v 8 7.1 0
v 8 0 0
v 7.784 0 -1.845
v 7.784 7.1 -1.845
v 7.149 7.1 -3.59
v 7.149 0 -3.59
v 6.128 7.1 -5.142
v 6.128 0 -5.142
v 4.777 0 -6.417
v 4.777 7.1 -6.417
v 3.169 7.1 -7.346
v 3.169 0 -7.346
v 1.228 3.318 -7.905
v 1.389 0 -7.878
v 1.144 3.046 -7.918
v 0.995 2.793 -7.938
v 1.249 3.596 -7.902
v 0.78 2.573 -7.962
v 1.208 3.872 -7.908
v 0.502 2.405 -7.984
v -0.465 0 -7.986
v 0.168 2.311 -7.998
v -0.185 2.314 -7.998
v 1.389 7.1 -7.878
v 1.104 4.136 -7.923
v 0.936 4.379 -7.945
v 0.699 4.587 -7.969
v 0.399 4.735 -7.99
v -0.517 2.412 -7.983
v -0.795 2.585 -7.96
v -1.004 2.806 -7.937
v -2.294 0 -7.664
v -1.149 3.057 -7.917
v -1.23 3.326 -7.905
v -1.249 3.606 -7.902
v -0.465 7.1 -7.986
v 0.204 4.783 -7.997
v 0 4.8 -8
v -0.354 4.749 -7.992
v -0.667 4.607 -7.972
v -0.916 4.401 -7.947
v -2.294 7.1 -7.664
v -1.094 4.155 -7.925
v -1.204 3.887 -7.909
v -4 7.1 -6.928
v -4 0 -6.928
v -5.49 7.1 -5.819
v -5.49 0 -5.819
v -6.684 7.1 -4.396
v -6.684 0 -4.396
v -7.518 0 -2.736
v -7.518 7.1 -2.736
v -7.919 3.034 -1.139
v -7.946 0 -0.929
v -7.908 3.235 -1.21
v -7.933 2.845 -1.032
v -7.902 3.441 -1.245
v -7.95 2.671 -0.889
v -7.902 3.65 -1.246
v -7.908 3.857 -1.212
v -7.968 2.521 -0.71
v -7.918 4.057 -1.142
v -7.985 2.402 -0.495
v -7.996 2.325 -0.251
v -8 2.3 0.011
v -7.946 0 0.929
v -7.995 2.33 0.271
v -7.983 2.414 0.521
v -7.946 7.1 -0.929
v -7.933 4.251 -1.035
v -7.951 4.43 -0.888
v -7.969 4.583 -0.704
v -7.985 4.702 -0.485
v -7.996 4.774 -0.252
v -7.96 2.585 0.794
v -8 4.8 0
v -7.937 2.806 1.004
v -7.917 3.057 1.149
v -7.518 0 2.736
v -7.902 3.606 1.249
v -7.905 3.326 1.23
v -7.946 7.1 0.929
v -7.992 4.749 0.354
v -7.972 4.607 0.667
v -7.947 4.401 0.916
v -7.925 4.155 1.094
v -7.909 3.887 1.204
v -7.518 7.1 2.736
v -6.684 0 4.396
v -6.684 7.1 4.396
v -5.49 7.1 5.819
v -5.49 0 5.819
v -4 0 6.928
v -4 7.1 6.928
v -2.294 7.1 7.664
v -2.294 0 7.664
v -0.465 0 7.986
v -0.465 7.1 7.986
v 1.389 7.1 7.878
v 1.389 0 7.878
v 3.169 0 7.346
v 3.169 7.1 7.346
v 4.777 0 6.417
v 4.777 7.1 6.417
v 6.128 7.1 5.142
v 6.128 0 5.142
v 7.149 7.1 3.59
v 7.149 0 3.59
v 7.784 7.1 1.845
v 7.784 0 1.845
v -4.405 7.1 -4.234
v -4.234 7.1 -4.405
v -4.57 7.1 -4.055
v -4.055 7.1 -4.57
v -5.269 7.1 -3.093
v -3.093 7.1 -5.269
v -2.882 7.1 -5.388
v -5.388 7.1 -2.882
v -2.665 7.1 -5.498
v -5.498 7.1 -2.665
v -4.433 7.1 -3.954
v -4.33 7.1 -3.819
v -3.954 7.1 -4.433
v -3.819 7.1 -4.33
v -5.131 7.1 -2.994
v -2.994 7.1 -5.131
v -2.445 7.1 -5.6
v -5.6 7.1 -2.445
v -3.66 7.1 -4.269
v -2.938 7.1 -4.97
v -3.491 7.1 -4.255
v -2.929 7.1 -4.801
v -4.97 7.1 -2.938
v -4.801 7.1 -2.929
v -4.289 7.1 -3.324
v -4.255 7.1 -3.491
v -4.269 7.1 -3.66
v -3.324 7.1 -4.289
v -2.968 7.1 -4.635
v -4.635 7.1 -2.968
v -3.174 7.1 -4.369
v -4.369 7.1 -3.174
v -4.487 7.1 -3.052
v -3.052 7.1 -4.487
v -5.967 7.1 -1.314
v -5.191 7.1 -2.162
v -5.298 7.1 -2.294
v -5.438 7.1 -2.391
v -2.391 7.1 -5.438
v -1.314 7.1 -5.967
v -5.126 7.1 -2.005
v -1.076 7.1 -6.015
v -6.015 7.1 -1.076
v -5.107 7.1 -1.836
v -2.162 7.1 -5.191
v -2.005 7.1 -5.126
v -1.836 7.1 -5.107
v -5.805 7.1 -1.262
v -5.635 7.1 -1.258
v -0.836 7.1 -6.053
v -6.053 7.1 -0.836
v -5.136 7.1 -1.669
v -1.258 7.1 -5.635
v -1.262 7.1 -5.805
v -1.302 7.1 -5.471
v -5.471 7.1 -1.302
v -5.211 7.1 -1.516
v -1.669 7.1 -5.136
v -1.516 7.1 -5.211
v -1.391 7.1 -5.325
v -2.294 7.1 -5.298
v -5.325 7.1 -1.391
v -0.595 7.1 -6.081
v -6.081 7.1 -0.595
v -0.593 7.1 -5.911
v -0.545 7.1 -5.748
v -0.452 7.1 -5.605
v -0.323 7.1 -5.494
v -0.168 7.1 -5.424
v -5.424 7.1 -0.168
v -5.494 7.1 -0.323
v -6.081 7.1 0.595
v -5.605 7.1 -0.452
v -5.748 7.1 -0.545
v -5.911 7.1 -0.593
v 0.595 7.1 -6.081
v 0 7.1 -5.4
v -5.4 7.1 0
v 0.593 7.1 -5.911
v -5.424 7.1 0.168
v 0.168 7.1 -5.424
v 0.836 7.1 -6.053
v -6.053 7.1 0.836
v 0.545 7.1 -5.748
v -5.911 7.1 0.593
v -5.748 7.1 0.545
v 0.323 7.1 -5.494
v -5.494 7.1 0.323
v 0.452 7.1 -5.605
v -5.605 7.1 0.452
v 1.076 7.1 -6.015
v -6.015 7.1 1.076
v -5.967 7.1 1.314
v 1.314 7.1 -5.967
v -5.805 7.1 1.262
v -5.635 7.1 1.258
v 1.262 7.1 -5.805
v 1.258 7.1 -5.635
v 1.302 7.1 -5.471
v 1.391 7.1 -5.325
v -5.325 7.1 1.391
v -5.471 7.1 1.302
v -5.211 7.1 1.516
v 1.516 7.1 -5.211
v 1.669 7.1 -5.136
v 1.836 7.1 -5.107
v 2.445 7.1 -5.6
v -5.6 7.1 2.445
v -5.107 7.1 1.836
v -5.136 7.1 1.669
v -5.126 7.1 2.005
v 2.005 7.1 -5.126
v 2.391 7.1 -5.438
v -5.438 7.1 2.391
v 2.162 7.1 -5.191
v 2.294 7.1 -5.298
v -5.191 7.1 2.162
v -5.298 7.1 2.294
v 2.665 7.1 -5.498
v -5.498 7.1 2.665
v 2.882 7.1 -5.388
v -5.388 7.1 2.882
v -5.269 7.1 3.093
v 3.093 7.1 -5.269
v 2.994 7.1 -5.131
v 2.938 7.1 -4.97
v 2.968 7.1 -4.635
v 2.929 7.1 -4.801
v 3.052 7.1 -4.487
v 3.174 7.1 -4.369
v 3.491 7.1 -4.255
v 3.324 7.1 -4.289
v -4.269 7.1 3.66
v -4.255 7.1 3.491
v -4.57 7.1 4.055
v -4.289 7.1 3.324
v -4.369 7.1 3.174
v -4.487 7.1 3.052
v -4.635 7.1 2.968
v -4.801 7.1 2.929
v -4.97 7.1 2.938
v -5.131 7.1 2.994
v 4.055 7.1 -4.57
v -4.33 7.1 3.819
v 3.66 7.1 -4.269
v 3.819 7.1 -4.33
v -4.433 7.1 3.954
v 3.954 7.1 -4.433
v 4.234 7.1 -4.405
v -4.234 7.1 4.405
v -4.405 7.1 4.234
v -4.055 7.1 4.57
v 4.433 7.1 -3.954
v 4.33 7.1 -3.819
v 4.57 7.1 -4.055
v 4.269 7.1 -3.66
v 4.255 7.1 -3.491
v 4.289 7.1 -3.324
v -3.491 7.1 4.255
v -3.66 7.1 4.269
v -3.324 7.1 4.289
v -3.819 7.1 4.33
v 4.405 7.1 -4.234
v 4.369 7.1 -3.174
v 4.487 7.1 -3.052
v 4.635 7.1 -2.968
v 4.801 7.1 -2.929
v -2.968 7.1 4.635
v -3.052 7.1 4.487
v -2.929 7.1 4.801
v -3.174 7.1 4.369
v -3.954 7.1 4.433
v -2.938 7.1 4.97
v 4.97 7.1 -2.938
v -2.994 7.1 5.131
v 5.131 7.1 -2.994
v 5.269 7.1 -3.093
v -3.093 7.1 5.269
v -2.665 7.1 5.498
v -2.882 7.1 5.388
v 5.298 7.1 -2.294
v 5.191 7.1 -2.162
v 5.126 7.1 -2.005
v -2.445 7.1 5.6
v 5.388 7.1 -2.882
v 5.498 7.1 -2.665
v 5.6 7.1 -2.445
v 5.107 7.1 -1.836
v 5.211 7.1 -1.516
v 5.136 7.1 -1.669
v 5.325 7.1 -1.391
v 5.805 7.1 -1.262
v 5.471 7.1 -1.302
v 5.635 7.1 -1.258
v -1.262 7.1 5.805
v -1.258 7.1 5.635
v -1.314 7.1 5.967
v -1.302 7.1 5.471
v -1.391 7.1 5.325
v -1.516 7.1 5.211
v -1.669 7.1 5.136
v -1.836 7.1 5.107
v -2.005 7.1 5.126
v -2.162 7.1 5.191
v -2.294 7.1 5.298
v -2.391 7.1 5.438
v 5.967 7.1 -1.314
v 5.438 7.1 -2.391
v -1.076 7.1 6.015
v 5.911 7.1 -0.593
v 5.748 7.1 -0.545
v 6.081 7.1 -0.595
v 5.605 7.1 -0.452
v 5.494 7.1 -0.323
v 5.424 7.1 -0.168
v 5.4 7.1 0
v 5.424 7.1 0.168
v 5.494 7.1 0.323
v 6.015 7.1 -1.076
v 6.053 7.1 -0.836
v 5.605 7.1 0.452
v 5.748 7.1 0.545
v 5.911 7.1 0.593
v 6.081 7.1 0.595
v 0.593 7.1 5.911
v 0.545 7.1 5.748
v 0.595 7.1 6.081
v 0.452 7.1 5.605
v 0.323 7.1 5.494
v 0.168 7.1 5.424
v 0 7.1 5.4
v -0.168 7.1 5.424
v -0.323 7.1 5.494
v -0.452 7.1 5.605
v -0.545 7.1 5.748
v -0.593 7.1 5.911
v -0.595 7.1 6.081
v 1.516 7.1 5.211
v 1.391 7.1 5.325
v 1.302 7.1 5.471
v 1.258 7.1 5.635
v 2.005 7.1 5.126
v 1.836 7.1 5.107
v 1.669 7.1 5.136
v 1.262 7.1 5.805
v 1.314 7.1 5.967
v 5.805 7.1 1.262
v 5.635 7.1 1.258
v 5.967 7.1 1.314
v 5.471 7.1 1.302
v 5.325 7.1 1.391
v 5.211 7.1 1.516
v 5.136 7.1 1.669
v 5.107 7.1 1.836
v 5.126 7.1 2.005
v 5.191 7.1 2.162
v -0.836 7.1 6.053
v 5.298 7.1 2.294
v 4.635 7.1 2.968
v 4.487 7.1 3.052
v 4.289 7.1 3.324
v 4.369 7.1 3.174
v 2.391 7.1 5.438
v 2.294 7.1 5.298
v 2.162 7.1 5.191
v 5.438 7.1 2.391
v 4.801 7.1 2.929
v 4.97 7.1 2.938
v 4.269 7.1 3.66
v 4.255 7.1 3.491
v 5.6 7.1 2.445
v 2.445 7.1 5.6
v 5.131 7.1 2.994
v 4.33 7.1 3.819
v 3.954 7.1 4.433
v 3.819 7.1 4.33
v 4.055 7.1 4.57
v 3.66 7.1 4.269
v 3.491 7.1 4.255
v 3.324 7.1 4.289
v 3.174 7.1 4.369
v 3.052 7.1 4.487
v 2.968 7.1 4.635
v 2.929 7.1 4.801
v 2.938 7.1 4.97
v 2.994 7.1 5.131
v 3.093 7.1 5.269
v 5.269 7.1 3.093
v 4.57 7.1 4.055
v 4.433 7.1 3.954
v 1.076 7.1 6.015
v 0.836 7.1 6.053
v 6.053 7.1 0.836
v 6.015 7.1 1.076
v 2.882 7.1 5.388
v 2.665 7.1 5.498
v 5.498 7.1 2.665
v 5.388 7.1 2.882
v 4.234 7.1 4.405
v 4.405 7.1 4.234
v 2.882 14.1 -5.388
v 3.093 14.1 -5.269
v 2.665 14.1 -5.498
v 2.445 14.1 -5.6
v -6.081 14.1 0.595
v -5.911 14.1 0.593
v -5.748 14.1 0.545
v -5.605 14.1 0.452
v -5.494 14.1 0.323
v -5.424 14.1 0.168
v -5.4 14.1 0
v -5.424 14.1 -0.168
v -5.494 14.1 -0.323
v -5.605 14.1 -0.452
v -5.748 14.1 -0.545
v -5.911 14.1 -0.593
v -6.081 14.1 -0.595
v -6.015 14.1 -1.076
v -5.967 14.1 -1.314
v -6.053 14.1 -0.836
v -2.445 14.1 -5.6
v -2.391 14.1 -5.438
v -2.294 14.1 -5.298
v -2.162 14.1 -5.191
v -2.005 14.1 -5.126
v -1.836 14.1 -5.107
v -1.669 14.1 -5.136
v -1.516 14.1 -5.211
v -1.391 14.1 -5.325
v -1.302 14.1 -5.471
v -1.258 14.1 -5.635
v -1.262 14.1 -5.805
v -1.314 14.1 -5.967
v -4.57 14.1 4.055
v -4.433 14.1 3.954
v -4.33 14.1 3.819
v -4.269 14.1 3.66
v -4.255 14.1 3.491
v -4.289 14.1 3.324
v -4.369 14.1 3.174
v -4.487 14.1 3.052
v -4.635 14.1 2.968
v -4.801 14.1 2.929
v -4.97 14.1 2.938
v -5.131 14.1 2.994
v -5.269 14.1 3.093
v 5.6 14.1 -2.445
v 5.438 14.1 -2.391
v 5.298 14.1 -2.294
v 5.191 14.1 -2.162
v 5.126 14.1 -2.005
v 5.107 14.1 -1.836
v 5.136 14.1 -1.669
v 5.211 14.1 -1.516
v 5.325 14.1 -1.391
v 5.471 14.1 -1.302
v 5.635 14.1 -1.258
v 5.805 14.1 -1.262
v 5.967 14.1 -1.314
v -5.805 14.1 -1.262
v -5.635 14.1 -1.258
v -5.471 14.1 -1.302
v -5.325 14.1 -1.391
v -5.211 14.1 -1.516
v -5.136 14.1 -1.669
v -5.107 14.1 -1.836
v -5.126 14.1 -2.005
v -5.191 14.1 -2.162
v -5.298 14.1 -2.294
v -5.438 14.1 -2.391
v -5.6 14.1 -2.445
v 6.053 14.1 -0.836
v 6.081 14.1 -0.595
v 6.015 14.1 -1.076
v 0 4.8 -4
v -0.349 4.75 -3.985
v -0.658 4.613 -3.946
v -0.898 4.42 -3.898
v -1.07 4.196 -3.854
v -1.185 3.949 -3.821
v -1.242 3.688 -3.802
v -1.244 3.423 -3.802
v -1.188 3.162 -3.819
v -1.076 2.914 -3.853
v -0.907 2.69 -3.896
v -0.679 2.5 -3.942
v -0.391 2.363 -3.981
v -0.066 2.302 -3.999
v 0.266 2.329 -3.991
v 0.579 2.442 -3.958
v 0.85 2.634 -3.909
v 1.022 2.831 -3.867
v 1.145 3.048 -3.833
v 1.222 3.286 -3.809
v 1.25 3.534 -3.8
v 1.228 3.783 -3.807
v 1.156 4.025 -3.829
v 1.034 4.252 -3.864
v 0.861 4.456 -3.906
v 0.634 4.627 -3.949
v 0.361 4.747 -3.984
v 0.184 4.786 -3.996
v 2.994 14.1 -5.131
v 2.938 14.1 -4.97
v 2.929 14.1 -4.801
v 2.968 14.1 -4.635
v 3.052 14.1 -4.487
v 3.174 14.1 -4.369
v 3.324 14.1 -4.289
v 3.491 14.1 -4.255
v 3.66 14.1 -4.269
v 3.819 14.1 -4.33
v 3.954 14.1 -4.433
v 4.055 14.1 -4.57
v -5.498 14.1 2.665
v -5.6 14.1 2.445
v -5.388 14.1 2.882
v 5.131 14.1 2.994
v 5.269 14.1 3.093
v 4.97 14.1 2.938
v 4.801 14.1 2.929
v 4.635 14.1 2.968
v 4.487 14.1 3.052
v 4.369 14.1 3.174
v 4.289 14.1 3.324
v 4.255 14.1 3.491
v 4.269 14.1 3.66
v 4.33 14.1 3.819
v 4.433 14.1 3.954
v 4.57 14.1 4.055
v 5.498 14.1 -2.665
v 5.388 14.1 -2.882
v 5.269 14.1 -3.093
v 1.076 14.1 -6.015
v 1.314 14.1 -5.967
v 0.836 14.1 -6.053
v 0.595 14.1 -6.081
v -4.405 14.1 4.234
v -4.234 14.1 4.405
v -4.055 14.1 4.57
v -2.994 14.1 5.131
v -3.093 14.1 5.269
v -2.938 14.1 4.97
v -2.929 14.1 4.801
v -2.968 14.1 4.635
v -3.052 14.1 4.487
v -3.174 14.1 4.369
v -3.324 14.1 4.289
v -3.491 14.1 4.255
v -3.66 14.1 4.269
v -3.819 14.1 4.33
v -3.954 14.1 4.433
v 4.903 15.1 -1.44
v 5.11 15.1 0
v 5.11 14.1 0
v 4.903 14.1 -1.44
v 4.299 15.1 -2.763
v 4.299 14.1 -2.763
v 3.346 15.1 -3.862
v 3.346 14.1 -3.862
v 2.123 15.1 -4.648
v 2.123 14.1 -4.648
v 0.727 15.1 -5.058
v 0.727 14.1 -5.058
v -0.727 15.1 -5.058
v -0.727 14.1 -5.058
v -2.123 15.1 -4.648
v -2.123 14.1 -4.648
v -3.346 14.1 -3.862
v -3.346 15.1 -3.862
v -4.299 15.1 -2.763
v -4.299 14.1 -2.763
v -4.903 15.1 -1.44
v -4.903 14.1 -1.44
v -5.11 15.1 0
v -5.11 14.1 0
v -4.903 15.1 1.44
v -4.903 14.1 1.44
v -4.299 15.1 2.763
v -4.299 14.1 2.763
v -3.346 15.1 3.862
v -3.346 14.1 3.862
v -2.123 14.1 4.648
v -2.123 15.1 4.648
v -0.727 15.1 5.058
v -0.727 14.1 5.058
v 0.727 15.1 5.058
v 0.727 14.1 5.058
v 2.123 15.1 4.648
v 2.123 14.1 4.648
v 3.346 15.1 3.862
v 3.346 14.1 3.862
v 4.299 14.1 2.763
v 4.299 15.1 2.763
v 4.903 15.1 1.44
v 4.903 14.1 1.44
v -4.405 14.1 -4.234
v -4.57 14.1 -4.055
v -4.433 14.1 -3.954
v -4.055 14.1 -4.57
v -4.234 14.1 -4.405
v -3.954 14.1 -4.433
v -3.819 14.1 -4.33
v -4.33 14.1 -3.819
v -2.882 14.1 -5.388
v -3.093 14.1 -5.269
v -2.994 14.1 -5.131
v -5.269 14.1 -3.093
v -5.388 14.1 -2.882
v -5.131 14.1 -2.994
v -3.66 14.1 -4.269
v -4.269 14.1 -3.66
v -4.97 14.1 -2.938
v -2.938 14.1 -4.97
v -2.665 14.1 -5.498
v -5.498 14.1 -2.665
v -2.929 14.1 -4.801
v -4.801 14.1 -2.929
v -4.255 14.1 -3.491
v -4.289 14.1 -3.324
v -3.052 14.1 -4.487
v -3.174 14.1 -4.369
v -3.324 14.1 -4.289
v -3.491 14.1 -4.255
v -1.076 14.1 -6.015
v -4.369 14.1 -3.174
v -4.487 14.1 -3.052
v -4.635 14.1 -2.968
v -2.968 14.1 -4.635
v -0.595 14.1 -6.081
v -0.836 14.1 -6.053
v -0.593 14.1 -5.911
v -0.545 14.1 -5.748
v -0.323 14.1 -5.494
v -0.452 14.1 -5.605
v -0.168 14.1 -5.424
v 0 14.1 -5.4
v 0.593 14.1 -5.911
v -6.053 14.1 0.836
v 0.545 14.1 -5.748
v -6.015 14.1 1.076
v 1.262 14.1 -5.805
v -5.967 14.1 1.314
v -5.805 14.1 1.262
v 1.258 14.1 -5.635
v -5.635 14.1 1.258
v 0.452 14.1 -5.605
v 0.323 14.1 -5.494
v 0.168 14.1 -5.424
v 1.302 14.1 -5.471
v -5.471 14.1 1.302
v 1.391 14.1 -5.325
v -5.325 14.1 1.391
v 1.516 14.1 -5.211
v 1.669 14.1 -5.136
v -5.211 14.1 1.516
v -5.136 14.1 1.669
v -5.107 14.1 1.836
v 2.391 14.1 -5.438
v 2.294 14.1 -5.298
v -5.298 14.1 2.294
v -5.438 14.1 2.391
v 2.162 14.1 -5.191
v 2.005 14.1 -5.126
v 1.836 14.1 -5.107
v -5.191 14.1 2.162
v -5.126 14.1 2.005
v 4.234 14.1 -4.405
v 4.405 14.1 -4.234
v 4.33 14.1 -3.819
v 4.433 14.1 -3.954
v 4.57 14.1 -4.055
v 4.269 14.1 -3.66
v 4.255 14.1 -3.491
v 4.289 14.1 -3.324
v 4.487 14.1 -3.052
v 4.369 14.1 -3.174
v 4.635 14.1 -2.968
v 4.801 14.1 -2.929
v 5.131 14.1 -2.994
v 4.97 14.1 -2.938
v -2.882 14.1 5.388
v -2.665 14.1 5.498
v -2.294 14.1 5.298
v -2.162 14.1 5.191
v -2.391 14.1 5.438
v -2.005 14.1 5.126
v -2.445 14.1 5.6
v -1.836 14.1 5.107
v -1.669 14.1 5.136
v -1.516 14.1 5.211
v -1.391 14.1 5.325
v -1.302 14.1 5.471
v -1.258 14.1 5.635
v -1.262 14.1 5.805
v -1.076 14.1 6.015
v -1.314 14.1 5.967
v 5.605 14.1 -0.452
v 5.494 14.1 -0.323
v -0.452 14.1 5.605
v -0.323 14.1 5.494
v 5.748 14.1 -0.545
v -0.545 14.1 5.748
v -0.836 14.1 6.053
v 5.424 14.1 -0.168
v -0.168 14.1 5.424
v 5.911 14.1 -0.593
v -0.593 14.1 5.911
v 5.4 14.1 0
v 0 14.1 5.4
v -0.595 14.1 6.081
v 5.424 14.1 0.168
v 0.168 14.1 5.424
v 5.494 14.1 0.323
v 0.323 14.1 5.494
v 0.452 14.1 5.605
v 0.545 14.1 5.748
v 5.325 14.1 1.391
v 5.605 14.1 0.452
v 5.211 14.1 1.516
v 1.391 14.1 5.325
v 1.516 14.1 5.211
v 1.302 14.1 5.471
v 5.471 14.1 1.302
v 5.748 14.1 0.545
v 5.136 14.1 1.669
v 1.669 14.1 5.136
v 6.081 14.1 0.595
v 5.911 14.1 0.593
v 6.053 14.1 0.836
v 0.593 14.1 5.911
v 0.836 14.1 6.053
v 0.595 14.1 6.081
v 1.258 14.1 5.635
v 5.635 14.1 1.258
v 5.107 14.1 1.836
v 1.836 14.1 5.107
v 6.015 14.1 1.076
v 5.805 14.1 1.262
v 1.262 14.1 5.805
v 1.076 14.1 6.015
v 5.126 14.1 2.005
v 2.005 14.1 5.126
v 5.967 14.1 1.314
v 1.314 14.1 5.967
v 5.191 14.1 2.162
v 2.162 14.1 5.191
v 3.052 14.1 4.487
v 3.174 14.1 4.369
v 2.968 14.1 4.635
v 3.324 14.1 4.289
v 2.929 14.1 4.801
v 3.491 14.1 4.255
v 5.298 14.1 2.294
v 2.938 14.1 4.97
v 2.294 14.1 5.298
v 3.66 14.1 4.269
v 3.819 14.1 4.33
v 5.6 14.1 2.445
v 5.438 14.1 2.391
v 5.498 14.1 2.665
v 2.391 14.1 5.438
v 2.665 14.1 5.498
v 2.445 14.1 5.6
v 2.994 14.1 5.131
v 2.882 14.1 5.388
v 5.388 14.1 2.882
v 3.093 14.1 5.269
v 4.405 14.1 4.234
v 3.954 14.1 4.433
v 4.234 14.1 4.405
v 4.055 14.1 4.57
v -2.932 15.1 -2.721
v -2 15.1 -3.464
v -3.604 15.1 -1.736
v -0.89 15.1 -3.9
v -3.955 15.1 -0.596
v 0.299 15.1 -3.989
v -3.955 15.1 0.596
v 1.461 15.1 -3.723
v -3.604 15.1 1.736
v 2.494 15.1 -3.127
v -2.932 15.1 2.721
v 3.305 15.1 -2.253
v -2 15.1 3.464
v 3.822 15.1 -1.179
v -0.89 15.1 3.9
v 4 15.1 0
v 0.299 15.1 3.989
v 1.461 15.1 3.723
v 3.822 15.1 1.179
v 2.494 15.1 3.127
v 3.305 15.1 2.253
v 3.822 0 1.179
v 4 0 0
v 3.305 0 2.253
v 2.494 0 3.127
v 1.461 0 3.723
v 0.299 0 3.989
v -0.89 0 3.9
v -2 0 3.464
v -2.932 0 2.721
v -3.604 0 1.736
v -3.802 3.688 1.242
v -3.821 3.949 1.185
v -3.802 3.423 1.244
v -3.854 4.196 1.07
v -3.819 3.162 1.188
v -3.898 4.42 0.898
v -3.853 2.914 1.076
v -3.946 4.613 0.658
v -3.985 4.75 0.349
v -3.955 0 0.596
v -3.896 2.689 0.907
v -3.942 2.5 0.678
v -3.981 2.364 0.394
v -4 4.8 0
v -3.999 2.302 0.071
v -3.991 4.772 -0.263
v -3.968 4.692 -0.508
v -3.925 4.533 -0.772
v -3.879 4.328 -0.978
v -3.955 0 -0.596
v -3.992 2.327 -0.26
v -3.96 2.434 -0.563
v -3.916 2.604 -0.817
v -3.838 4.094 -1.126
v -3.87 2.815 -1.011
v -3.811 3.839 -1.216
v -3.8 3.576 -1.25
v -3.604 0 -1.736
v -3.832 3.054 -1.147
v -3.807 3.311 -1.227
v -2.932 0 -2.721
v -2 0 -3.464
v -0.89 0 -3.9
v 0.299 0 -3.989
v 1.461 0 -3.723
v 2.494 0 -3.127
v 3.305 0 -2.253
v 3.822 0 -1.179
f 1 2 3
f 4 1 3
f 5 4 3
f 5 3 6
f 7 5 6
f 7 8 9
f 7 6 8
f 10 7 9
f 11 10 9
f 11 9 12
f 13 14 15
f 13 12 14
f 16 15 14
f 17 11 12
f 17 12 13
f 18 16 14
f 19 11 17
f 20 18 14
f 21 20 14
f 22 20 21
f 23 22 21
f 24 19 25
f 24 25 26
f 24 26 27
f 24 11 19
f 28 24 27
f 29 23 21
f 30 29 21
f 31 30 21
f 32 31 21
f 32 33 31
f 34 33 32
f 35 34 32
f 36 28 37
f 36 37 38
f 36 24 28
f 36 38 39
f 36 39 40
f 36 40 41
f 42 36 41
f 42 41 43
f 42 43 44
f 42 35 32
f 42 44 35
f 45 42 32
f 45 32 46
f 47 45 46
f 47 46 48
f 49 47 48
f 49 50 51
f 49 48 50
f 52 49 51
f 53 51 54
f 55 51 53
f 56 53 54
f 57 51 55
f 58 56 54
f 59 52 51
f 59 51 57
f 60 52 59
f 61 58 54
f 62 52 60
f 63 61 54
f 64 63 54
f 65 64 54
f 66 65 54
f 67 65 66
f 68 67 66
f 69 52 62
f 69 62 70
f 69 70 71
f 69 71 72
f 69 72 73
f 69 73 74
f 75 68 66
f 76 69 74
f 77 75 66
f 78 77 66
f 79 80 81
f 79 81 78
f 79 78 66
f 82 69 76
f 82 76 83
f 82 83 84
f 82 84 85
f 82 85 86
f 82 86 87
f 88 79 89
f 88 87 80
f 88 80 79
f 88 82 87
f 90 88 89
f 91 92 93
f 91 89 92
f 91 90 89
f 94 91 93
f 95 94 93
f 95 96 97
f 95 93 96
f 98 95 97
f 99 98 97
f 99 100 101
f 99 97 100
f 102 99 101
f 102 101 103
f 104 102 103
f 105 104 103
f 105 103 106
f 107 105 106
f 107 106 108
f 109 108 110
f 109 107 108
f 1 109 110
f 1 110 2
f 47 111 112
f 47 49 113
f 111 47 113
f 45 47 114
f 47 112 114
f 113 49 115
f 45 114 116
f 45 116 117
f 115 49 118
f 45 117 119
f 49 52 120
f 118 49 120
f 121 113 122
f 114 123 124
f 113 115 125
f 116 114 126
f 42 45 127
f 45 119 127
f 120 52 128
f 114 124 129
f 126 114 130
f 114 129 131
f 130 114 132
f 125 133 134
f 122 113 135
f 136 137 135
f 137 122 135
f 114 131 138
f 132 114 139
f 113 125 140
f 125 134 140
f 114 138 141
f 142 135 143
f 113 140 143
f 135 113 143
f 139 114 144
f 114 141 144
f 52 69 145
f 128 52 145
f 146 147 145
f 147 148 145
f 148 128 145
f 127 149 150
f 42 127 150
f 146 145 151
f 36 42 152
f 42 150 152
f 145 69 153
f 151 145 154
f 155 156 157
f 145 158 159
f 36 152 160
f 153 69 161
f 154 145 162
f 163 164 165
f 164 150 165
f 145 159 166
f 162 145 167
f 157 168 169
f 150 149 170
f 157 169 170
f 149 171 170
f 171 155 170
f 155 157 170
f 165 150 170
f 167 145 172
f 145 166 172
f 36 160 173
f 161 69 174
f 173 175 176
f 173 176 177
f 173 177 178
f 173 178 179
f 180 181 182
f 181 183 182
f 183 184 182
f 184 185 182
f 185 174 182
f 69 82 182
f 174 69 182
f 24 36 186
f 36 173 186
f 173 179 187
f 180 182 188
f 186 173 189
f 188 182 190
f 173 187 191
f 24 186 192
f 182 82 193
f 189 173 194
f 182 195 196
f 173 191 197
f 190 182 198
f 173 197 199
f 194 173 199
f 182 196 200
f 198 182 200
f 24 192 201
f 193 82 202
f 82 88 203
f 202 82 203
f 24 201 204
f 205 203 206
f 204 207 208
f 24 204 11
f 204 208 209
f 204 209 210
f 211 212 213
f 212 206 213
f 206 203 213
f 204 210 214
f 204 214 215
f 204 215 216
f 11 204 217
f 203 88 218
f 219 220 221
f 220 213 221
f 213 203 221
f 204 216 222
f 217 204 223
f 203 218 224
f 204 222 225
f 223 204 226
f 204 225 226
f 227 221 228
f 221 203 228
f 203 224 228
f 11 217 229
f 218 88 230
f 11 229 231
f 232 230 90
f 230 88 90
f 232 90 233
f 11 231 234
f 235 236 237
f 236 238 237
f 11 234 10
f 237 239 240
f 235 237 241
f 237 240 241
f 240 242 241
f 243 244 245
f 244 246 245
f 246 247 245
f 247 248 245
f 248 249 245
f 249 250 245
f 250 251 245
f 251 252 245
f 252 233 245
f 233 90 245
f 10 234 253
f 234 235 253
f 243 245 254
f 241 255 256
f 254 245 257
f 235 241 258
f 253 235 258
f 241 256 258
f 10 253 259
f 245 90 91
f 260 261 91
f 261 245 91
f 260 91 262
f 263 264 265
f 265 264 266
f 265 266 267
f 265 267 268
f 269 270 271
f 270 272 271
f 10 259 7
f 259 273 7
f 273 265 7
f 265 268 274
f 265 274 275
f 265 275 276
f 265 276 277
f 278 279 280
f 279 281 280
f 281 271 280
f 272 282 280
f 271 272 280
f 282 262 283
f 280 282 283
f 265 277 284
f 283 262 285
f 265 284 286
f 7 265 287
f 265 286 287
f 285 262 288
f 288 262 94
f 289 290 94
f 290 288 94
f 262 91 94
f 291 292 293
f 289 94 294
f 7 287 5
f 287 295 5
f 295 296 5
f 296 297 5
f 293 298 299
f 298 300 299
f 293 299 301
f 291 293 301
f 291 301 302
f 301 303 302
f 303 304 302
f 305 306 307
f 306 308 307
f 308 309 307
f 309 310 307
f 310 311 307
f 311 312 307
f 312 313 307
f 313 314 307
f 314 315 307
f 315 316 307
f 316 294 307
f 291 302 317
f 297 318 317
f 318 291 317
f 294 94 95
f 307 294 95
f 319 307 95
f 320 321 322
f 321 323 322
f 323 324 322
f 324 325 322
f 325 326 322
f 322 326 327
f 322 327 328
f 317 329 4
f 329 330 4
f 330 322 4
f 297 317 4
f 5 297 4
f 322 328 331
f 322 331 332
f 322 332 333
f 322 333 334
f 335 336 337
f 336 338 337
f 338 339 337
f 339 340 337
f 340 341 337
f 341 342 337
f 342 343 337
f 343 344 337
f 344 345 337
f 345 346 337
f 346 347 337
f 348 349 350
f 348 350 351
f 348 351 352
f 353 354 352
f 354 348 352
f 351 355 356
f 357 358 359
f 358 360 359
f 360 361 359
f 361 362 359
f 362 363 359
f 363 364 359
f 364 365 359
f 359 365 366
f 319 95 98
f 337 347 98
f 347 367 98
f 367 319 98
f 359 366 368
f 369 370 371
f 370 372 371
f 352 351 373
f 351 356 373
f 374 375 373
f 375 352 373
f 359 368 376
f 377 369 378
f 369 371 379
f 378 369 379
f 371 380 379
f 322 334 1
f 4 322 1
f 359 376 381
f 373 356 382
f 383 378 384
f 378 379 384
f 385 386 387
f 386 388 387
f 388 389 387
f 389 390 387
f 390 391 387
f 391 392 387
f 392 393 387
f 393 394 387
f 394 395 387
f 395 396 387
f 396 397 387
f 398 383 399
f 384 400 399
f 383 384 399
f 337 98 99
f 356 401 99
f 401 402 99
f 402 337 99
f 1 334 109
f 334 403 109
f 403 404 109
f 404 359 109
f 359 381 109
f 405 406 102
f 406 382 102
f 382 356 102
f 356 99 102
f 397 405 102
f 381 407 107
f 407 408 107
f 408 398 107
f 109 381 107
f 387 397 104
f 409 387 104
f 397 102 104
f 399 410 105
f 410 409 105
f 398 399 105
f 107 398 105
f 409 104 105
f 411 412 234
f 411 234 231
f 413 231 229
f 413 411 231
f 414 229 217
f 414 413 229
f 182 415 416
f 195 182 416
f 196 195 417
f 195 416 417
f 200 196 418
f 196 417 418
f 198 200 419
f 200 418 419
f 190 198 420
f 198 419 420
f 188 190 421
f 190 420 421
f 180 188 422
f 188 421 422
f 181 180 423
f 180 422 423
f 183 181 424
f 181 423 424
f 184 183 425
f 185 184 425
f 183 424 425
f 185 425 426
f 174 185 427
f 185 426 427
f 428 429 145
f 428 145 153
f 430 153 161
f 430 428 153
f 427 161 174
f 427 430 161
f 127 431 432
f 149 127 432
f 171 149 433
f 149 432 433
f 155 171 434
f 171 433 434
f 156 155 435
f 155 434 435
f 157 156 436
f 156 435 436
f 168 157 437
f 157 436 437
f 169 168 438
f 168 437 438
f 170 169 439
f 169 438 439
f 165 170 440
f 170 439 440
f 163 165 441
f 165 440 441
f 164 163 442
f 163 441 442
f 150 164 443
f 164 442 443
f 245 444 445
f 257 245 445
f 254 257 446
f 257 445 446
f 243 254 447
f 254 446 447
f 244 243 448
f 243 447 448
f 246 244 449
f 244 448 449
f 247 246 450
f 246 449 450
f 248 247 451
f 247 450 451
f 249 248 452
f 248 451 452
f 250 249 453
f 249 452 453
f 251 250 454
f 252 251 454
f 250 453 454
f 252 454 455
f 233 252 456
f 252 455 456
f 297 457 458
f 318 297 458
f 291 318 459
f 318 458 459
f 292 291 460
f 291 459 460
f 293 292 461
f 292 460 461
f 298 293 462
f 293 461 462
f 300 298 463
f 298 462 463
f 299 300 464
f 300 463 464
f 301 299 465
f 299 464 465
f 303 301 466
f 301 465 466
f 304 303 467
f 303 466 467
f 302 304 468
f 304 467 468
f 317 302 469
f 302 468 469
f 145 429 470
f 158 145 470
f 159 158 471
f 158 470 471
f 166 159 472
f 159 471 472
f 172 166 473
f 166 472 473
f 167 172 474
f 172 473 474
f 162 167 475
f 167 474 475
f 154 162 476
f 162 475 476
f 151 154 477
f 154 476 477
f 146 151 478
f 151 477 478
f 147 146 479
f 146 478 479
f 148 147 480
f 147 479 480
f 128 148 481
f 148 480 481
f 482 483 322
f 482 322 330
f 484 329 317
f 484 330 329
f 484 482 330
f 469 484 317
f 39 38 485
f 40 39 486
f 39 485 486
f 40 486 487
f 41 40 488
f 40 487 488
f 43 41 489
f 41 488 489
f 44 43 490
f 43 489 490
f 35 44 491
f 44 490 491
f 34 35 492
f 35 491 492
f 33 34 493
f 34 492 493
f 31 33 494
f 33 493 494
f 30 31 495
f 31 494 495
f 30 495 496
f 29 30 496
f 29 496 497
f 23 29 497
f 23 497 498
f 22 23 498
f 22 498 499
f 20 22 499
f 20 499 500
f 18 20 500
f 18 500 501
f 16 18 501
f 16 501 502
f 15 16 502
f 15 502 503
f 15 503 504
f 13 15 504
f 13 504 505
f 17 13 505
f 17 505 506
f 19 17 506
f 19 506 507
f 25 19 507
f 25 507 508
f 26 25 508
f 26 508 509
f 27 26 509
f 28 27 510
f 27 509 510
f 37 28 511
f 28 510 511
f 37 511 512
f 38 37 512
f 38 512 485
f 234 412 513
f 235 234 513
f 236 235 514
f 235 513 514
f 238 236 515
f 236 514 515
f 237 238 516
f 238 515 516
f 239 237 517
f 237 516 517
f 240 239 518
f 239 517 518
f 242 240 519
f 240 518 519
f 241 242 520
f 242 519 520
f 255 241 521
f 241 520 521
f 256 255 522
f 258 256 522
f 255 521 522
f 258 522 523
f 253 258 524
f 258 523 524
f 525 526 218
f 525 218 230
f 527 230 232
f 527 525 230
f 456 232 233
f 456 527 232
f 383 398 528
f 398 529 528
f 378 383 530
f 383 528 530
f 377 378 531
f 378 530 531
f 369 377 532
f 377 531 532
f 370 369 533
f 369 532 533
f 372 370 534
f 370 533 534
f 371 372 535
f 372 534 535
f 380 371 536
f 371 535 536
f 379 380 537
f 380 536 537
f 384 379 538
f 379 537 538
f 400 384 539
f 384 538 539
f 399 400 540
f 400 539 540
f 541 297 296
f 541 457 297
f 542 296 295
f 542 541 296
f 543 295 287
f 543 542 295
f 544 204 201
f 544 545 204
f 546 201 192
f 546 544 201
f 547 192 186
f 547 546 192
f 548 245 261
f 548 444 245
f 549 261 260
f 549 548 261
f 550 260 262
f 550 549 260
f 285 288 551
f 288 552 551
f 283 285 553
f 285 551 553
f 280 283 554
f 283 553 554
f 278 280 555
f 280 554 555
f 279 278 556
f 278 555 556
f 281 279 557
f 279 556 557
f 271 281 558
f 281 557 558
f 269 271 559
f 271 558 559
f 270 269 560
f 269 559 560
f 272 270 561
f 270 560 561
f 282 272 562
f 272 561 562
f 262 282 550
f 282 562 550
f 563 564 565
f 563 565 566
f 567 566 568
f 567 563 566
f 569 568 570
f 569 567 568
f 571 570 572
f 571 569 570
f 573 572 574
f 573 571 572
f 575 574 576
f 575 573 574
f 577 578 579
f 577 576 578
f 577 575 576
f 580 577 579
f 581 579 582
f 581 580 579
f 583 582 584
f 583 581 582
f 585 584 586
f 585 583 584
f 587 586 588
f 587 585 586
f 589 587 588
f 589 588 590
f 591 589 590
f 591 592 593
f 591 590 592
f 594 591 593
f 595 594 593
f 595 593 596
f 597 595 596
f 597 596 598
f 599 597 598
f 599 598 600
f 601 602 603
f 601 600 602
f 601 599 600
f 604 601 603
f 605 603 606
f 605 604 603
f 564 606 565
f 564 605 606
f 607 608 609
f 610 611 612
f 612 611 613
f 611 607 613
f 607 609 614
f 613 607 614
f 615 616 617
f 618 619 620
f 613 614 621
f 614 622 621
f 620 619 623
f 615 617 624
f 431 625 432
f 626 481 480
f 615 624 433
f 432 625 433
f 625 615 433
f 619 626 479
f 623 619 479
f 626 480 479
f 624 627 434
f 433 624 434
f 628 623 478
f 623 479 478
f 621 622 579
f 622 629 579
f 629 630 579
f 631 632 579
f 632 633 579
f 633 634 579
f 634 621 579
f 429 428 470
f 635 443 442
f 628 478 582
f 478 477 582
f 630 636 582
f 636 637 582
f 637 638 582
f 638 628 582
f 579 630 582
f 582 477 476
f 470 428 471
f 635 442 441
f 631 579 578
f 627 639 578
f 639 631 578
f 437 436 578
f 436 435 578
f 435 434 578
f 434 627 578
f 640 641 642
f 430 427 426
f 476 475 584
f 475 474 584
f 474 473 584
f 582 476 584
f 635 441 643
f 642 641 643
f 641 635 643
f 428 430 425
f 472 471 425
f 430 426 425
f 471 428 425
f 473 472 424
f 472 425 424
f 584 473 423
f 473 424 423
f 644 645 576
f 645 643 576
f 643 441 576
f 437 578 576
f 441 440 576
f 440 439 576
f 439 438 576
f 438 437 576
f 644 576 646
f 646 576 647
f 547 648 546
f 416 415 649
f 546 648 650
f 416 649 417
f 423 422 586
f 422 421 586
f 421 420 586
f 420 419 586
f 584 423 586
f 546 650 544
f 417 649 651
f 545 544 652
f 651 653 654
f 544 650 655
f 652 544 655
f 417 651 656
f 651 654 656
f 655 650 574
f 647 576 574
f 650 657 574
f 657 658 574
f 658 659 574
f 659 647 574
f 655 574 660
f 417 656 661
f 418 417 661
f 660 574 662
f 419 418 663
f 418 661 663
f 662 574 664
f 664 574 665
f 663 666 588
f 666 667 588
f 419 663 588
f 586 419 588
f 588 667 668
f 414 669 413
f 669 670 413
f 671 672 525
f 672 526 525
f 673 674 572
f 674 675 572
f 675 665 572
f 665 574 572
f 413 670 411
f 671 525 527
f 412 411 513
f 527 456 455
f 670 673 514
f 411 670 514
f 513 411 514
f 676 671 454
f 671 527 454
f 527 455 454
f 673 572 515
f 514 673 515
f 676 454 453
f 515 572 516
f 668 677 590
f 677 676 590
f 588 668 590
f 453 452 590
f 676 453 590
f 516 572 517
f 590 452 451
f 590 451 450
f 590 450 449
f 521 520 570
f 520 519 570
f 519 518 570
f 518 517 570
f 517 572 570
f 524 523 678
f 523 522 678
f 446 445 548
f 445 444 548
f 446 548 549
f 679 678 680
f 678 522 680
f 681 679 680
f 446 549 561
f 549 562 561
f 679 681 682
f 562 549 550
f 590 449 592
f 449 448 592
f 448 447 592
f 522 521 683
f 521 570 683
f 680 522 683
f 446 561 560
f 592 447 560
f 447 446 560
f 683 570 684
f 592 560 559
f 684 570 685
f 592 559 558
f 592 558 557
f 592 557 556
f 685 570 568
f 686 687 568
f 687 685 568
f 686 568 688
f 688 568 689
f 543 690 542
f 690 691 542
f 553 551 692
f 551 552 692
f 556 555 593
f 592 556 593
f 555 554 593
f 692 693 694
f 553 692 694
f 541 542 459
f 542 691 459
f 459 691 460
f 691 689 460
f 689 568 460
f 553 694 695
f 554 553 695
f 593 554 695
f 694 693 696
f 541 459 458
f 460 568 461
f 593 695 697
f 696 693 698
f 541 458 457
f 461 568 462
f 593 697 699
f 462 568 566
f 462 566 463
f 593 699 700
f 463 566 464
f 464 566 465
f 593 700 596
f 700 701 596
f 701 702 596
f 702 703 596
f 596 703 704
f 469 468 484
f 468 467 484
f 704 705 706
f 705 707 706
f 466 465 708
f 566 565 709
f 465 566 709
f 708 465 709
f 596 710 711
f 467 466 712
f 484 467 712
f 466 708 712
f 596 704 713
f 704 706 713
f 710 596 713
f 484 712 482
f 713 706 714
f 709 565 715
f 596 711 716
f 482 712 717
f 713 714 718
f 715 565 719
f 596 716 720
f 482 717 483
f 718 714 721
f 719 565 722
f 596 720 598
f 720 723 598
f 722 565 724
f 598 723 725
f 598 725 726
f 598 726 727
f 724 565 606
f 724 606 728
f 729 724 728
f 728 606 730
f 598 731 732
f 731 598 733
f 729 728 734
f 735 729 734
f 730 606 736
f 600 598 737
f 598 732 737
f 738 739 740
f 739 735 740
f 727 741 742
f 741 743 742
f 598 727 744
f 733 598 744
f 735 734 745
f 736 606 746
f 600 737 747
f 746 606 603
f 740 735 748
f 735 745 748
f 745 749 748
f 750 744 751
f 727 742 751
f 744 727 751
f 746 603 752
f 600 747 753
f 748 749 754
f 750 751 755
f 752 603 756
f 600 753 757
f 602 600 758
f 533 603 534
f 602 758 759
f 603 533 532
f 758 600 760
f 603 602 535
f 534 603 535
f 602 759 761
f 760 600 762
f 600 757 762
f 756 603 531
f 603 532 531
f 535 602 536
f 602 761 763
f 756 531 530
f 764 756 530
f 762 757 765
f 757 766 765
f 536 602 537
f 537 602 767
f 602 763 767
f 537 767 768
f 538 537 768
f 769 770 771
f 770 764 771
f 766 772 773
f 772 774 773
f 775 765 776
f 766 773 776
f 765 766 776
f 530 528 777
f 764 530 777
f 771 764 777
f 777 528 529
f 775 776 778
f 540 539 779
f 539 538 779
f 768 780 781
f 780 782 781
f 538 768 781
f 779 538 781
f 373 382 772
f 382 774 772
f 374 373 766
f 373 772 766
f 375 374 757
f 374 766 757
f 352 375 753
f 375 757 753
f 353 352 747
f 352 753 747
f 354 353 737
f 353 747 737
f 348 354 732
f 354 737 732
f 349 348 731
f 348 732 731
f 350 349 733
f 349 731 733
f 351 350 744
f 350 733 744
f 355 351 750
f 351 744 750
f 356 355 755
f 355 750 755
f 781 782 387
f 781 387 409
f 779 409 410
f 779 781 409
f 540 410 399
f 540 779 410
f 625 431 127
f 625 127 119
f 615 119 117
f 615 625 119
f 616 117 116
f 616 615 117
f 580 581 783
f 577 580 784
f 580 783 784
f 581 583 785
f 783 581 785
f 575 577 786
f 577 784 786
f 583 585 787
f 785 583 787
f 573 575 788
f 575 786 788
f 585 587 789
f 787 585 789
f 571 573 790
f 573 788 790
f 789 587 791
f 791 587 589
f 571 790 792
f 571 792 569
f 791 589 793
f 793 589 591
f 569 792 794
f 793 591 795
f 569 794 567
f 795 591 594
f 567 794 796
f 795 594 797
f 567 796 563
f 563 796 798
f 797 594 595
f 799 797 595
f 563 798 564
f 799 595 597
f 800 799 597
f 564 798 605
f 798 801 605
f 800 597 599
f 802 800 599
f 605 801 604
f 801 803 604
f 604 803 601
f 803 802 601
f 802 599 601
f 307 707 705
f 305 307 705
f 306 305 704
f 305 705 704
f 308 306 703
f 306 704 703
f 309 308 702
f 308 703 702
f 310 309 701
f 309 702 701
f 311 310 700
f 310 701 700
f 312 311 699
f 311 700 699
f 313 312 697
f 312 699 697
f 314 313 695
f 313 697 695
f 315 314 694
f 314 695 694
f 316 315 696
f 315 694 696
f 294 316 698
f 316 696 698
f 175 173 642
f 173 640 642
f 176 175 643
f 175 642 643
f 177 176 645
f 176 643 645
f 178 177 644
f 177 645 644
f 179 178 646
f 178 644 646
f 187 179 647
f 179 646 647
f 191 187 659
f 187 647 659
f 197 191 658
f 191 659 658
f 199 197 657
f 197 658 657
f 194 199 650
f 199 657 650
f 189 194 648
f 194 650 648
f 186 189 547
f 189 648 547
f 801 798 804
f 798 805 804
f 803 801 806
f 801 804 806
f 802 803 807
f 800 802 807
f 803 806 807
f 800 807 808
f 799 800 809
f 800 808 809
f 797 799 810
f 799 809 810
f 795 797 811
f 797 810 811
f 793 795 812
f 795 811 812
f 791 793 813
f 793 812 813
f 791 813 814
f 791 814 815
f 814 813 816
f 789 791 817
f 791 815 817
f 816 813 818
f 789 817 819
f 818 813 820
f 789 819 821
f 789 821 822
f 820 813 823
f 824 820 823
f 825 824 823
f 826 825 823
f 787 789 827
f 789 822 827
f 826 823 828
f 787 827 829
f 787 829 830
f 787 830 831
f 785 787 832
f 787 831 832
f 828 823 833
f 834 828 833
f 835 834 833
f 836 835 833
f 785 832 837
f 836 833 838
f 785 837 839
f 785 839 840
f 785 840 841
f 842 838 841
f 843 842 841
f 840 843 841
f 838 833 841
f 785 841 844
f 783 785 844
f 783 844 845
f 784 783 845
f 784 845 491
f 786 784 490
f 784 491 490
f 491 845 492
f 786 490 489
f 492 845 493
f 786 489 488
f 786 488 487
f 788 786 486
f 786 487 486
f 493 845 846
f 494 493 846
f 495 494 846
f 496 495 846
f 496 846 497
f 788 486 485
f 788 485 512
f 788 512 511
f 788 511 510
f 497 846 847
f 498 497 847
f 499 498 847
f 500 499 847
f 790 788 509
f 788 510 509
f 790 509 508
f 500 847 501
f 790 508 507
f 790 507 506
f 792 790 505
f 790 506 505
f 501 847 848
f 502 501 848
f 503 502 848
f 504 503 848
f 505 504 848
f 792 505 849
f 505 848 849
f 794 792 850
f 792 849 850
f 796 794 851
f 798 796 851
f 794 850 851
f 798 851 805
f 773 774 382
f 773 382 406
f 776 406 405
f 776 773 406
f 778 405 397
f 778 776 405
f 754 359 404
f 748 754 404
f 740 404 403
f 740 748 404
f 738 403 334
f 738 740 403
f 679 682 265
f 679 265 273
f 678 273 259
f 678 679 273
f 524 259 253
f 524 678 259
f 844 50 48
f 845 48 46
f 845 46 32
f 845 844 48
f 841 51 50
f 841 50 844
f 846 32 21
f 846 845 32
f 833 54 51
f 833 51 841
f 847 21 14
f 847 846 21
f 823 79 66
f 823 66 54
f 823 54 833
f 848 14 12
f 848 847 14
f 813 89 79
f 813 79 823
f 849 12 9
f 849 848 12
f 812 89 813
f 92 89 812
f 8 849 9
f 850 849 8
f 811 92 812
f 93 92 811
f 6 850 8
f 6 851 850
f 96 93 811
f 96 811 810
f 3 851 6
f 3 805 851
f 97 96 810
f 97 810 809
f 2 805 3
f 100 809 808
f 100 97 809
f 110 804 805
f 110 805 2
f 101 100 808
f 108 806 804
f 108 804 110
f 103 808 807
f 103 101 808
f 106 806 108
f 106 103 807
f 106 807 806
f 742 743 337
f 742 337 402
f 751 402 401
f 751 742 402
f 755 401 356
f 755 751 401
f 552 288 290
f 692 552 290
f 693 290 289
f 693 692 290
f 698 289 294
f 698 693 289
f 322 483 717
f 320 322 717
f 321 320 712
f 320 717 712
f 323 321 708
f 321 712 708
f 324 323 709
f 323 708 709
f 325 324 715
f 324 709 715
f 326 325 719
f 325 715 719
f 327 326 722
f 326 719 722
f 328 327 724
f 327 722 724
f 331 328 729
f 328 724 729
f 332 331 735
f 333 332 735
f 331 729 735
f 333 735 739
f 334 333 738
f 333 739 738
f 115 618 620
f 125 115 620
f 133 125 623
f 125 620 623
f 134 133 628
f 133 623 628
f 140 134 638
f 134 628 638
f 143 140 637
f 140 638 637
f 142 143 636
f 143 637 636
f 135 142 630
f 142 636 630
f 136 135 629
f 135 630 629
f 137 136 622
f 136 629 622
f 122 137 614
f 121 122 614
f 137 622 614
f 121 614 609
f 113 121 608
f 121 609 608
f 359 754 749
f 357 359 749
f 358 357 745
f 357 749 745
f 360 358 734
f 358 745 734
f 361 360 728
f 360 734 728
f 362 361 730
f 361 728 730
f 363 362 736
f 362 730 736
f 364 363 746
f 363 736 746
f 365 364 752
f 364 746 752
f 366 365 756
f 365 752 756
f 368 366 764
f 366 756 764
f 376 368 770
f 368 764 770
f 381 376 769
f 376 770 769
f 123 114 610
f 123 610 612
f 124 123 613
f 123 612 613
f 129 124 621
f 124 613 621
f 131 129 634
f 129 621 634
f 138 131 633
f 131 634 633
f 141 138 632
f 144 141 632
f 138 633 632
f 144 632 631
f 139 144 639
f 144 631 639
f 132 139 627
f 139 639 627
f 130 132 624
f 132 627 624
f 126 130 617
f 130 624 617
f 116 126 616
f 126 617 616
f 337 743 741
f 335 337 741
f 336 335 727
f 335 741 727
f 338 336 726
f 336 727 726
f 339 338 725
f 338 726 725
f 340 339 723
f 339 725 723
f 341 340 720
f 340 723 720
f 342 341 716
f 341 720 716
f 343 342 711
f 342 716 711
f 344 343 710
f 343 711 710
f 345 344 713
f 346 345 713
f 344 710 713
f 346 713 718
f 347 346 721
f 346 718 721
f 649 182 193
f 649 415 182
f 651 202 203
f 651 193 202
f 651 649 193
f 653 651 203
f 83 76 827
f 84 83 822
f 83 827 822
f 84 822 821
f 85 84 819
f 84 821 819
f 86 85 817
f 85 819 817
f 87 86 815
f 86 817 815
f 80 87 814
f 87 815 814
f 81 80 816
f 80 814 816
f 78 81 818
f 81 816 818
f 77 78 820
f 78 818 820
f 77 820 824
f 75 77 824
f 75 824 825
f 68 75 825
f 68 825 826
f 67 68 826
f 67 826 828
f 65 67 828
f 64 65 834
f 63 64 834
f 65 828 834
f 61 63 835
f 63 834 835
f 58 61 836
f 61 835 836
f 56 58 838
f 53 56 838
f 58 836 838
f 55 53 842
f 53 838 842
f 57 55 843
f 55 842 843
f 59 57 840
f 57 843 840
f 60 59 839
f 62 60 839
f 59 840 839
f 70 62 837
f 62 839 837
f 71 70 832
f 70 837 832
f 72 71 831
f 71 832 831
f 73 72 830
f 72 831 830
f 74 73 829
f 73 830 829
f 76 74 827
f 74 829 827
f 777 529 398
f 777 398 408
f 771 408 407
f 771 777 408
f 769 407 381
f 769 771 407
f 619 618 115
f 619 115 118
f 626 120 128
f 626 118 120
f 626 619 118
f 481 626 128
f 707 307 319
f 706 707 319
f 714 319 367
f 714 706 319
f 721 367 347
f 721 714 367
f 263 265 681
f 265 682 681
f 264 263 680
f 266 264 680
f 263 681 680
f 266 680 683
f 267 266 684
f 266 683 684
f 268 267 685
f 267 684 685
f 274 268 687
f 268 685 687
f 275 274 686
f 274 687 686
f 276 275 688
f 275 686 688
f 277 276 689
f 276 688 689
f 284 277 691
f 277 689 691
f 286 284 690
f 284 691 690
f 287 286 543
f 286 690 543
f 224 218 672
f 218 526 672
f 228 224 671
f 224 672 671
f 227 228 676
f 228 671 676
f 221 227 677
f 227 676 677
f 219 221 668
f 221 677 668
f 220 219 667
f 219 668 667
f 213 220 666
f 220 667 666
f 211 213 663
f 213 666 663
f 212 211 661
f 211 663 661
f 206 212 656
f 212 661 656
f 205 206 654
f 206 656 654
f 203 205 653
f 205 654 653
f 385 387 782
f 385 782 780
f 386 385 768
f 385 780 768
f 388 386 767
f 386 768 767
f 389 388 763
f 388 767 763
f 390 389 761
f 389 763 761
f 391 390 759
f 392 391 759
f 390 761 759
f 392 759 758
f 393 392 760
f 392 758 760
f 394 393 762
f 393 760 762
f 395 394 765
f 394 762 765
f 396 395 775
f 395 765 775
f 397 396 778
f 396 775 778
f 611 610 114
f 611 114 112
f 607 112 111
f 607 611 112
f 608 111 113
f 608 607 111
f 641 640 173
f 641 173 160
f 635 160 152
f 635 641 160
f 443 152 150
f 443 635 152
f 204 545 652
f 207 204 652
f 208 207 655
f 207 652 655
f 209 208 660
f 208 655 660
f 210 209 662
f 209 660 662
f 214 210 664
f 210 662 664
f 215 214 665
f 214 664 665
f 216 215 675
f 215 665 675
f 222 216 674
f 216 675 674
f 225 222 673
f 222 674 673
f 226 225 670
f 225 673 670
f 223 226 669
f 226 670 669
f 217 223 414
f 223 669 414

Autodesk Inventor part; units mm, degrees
ref_plane "YZ Plane" through (0, 0, 0) normal (1, 0, 0) x (0, 1, 0)
ref_plane "XZ Plane" through (0, 0, 0) normal (0, 1, 0) x (-1, 0, 0)
ref_plane "XY Plane" through (0, 0, 0) normal (0, 0, 1) x (1, 0, 0)
sketch "Sketch1" plane through (0, 0, 0) normal (0, 0, 1) x (1, 0, 0)
  line L0 (0, 0) -> (4, 0) construction
  line L1 (8, 0) -> (8, 7.1)
  line L2 (8, 7.1) -> (6.11, 7.1)
  line L3 (6.11, 7.1) -> (6.11, 14.1)
  line L4 (6.11, 14.1) -> (5.11, 14.1)
  line L5 (5.11, 14.1) -> (5.11, 15.1)
  line L6 (5.11, 15.1) -> (4, 15.1)
  line L7 (0, 15.1) -> (0, 0) construction
  line L8 (4, 15.1) -> (4, 0)
  line L9 (4, 15.1) -> (0, 15.1) construction
  line L10 (4, 0) -> (8, 0)
  dimension "d0" = 7
  dimension "d1" = 7.1
  dimension "d2" = 8
  dimension "d3" = 6.11
  dimension "d5" = 1
  dimension "d6" = 1
  dimension "d15" = 4
revolve "Revolution1" add sketch "Sketch1" angle 360 about axis through (0, 15.1, 0) along (0, -1, 0)
sketch "Sketch2" plane through (0, 14.1, 0) normal (0, 1, 0) x (1, 0, 0)
  circle A0 centre (0, 0) radius 5.11 construction
  line L0 (0, 0) -> (-6, 0) construction
  circle A1 centre (-6, 0) radius 0.6
  point P0 (0, 0)
  dimension "d8" = 1.2
  dimension "d9" = 6
extrude "Extrusion1" cut sketch "Sketch2" against normal up to surface (7 mm away)
pattern_circular "Circular Pattern1" count 20 over 360 about axis through (0, 14.6, 0) along (0, -1, 0) of "Extrusion1"
sketch "Sketch3" plane through (0, 0, 0) normal (1, 0, 0) x (0, 1, 0)
  line L0 (7.1, 8) -> (7.1, -8) construction
  line L1 (0, 8) -> (0, -8) construction
  line L2 (0, 0) -> (7.1, 0) construction
  circle A0 centre (3.55, 0) radius 1.25
  dimension "d16" = 2.5
extrude "Extrusion2" cut sketch "Sketch3" against normal blind 10
pattern_circular "Circular Pattern2" count 2 over 90 about axis through (0, 7.55, 0) along (0, -1, 0) of "Extrusion2"
properties part number "GT2Pulley_20T_8mm"
